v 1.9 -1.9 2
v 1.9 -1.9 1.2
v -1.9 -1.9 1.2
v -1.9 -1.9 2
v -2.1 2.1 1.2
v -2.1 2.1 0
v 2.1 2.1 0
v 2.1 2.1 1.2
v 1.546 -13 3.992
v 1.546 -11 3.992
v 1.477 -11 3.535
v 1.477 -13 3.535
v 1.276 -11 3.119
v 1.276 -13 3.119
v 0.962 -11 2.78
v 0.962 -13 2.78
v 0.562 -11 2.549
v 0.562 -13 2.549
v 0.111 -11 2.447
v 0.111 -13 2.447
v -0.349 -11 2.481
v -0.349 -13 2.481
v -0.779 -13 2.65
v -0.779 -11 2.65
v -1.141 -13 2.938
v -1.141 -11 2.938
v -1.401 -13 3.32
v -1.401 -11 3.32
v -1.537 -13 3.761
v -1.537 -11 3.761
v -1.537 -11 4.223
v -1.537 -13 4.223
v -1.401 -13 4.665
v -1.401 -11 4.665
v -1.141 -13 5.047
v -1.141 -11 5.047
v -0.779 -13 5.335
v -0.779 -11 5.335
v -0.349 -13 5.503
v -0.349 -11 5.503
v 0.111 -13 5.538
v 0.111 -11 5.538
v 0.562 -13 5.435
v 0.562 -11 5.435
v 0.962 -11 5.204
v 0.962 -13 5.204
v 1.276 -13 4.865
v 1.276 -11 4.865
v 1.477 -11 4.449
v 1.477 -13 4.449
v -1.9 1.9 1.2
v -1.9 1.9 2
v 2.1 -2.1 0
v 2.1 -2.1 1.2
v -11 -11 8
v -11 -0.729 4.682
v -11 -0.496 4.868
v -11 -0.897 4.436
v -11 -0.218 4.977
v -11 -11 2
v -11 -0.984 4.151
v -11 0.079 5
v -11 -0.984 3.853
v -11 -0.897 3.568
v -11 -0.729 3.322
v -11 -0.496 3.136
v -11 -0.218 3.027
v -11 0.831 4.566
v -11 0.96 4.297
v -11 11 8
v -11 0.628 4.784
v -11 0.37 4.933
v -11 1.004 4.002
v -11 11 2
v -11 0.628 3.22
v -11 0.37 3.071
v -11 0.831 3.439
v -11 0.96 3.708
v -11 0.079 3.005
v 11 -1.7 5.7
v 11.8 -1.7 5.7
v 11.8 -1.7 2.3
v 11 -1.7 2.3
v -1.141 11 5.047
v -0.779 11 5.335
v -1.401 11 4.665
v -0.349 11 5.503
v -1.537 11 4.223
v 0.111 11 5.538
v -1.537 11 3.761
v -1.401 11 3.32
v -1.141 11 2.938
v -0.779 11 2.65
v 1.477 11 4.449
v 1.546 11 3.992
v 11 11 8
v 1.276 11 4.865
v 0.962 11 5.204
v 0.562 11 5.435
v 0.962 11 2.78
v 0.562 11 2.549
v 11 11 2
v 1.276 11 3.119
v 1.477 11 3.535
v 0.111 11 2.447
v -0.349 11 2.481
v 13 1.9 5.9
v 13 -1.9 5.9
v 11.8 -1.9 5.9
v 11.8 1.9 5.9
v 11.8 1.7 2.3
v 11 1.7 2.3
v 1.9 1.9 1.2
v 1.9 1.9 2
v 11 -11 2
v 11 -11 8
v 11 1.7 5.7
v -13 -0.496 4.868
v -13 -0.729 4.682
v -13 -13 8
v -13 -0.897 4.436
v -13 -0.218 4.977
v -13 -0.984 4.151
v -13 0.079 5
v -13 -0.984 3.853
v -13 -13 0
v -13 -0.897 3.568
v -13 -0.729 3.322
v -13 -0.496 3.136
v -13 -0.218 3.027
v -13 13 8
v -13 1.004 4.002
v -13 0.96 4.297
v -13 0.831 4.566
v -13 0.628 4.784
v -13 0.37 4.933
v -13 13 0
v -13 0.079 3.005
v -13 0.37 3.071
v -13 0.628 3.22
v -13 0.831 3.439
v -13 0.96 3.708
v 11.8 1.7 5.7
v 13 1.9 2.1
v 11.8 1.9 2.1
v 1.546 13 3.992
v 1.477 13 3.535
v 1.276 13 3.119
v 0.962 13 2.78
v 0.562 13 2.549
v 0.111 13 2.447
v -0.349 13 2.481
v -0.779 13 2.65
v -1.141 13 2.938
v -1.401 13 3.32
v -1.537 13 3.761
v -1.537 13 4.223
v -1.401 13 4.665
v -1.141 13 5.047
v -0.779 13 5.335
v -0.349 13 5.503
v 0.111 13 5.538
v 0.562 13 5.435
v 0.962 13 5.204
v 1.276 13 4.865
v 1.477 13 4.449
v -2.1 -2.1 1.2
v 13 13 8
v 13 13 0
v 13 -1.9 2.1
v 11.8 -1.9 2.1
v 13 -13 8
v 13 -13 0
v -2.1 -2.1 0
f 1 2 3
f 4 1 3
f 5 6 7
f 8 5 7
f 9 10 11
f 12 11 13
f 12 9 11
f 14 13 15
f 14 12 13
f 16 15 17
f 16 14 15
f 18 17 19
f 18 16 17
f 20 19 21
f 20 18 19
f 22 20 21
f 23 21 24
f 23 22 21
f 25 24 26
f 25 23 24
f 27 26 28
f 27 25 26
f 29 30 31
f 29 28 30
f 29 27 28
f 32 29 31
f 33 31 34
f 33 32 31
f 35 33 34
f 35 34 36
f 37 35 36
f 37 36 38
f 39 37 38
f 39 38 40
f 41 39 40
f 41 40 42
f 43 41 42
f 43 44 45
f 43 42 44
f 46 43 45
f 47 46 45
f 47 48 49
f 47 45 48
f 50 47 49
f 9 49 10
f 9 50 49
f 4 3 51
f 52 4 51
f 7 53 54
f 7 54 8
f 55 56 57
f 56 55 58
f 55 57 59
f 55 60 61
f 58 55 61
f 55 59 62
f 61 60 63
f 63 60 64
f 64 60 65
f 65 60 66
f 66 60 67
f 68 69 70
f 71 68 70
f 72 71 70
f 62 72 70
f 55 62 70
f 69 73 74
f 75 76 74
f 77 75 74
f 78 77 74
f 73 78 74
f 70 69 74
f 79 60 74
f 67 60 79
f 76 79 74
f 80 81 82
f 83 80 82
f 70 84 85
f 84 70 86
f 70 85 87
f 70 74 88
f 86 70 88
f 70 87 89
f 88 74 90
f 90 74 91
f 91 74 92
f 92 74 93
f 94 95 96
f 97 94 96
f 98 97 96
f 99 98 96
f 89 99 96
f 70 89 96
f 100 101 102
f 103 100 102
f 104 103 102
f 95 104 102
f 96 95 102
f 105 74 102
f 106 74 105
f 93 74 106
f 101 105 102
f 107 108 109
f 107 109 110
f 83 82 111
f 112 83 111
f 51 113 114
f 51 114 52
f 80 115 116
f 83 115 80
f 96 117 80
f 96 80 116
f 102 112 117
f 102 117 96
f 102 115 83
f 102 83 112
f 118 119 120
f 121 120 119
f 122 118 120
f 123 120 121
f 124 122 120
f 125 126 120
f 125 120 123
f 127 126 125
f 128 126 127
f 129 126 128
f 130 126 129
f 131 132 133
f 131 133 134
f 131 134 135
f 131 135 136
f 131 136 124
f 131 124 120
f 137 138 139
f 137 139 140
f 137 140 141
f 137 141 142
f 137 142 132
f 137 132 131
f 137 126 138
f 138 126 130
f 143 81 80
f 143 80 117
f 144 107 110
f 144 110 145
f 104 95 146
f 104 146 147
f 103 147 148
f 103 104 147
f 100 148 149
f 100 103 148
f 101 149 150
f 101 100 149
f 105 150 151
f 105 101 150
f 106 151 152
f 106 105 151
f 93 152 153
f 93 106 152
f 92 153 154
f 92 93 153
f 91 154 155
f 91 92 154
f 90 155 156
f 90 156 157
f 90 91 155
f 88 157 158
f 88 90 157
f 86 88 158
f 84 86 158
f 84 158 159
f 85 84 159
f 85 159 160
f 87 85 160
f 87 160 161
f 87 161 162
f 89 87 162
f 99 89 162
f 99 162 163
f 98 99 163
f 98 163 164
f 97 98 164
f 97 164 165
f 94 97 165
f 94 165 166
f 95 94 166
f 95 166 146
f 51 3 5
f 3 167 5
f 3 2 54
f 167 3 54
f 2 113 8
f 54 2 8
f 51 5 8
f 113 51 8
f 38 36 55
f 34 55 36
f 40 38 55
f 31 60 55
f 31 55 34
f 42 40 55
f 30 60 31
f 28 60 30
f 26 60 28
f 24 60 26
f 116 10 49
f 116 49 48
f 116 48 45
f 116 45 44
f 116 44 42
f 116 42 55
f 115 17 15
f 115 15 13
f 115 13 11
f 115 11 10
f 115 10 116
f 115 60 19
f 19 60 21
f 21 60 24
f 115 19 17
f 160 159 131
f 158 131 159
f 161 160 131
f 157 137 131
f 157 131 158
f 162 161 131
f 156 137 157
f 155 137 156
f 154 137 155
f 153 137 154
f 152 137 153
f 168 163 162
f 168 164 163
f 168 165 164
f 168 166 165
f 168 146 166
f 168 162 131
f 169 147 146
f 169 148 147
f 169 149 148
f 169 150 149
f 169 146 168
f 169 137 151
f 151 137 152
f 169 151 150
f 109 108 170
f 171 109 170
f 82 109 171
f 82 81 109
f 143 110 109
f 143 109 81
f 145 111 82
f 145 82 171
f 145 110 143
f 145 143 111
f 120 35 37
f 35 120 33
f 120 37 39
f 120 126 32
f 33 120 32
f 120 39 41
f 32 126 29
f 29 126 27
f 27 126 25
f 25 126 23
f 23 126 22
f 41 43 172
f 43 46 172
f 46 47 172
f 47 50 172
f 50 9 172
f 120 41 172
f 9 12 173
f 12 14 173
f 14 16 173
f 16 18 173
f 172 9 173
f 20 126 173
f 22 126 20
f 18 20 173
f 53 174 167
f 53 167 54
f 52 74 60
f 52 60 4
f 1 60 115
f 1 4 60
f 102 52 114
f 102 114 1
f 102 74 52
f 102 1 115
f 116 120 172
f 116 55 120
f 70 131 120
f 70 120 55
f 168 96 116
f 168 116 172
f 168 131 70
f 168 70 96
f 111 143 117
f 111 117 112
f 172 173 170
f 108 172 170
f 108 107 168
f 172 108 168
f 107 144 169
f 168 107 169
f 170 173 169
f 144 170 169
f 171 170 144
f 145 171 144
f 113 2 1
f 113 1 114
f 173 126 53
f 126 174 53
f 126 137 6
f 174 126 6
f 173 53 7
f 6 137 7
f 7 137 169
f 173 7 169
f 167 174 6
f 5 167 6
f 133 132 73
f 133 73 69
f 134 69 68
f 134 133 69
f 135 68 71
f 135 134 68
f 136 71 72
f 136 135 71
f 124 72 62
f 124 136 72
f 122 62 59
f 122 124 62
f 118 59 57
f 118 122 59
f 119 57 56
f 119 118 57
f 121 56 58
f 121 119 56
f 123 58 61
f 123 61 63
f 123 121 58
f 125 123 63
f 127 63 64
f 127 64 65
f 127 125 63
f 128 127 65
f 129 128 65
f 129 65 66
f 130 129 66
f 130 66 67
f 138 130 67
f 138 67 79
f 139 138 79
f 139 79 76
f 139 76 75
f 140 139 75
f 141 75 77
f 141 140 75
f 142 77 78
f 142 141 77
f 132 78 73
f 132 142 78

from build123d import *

# Parameters (mm, degrees)
SKETCH1_W            = 26
SKETCH1_H            = 26
SKETCH1_W_2          = 22
SKETCH1_H_2          = 22
BOSS_EXTRUDE16_DEPTH = 8
SKETCH1_5_W          = 22
SKETCH1_5_H          = 22
BOSS_EXTRUDE17_DEPTH = 2
SKETCH4_W            = 4.2
SKETCH4_H            = 4.2
CUT_EXTRUDE3_DEPTH   = 1.2
SKETCH8_W            = 3.8
SKETCH8_H            = 3.8
CUT_EXTRUDE4_DEPTH   = 2
HOLE2_START          = -13
HOLE2_OUTLINE_R      = 1.55
HOLE2_DEPTH          = 26
HOLE4_START          = -13
HOLE4_OUTLINE_R      = 1
HOLE4_DEPTH          = 2
SKETCH15_W           = 3.4
SKETCH15_H           = 3.4
CUT_EXTRUDE25_DEPTH  = 2
SKETCH15_6_W         = 3.8
SKETCH15_6_H         = 3.8
SKETCH15_6_W_2       = 3.4
SKETCH15_6_H_2       = 3.4
CUT_EXTRUDE26_DEPTH  = 1.2


# Read off the part's stored shape, not the designer's step: Hole2, Hole4
with BuildPart() as part:
    # Sketch1 → Boss-Extrude16 (new body)
    with BuildSketch(Plane.XY):
        Rectangle(SKETCH1_W, SKETCH1_H)
        Rectangle(SKETCH1_W_2, SKETCH1_H_2, mode=Mode.SUBTRACT)
    extrude(amount=BOSS_EXTRUDE16_DEPTH)

    # Sketch1<5> → Boss-Extrude17 (add)
    with BuildSketch(Plane.XY):
        Rectangle(SKETCH1_5_W, SKETCH1_5_H)
    extrude(amount=BOSS_EXTRUDE17_DEPTH)

    # Sketch4 → Cut-Extrude3 (cut)
    with BuildSketch(Plane.XY):
        Rectangle(SKETCH4_W, SKETCH4_H)
    extrude(amount=CUT_EXTRUDE3_DEPTH, mode=Mode.SUBTRACT)

    # Sketch8 → Cut-Extrude4 (cut)
    with BuildSketch(Plane(origin=(0, 0, 1.2), x_dir=(-1, 0, 0), z_dir=(0, 0, -1))):
        Rectangle(SKETCH8_W, SKETCH8_H)
    extrude(amount=-CUT_EXTRUDE4_DEPTH, mode=Mode.SUBTRACT)

    # Hole2 outline → Hole2 (cut)
    with BuildSketch(Plane(origin=(0, 0, 0), x_dir=(1, 0, 0), z_dir=(0, 1, 0)).offset(HOLE2_START)):
        with Locations((-0.00435538, -3.992237836)):
            Circle(HOLE2_OUTLINE_R)
    extrude(amount=HOLE2_DEPTH, mode=Mode.SUBTRACT)

    # Hole4 outline → Hole4 (cut)
    with BuildSketch(Plane.YZ.offset(HOLE4_START)):
        with Locations((0.004397166, 4.002298356)):
            Circle(HOLE4_OUTLINE_R)
    extrude(amount=HOLE4_DEPTH, mode=Mode.SUBTRACT)

    # Sketch15 → Cut-Extrude25 (cut)
    with BuildSketch(Plane(origin=(13, 0, 0), x_dir=(0, 0, -1), z_dir=(1, 0, 0))):
        with Locations((-4, 0)):
            Rectangle(SKETCH15_W, SKETCH15_H)
    extrude(amount=-CUT_EXTRUDE25_DEPTH, mode=Mode.SUBTRACT)

    # Sketch15<6> → Cut-Extrude26 (cut)
    with BuildSketch(Plane(origin=(13, 0, 0), x_dir=(0, 0, -1), z_dir=(1, 0, 0))):
        with Locations((-4, 0)):
            Rectangle(SKETCH15_6_W, SKETCH15_6_H)
        with Locations((-4, 0)):
            Rectangle(SKETCH15_6_W_2, SKETCH15_6_H_2, mode=Mode.SUBTRACT)
    extrude(amount=-CUT_EXTRUDE26_DEPTH, mode=Mode.SUBTRACT)


solid = part.part
